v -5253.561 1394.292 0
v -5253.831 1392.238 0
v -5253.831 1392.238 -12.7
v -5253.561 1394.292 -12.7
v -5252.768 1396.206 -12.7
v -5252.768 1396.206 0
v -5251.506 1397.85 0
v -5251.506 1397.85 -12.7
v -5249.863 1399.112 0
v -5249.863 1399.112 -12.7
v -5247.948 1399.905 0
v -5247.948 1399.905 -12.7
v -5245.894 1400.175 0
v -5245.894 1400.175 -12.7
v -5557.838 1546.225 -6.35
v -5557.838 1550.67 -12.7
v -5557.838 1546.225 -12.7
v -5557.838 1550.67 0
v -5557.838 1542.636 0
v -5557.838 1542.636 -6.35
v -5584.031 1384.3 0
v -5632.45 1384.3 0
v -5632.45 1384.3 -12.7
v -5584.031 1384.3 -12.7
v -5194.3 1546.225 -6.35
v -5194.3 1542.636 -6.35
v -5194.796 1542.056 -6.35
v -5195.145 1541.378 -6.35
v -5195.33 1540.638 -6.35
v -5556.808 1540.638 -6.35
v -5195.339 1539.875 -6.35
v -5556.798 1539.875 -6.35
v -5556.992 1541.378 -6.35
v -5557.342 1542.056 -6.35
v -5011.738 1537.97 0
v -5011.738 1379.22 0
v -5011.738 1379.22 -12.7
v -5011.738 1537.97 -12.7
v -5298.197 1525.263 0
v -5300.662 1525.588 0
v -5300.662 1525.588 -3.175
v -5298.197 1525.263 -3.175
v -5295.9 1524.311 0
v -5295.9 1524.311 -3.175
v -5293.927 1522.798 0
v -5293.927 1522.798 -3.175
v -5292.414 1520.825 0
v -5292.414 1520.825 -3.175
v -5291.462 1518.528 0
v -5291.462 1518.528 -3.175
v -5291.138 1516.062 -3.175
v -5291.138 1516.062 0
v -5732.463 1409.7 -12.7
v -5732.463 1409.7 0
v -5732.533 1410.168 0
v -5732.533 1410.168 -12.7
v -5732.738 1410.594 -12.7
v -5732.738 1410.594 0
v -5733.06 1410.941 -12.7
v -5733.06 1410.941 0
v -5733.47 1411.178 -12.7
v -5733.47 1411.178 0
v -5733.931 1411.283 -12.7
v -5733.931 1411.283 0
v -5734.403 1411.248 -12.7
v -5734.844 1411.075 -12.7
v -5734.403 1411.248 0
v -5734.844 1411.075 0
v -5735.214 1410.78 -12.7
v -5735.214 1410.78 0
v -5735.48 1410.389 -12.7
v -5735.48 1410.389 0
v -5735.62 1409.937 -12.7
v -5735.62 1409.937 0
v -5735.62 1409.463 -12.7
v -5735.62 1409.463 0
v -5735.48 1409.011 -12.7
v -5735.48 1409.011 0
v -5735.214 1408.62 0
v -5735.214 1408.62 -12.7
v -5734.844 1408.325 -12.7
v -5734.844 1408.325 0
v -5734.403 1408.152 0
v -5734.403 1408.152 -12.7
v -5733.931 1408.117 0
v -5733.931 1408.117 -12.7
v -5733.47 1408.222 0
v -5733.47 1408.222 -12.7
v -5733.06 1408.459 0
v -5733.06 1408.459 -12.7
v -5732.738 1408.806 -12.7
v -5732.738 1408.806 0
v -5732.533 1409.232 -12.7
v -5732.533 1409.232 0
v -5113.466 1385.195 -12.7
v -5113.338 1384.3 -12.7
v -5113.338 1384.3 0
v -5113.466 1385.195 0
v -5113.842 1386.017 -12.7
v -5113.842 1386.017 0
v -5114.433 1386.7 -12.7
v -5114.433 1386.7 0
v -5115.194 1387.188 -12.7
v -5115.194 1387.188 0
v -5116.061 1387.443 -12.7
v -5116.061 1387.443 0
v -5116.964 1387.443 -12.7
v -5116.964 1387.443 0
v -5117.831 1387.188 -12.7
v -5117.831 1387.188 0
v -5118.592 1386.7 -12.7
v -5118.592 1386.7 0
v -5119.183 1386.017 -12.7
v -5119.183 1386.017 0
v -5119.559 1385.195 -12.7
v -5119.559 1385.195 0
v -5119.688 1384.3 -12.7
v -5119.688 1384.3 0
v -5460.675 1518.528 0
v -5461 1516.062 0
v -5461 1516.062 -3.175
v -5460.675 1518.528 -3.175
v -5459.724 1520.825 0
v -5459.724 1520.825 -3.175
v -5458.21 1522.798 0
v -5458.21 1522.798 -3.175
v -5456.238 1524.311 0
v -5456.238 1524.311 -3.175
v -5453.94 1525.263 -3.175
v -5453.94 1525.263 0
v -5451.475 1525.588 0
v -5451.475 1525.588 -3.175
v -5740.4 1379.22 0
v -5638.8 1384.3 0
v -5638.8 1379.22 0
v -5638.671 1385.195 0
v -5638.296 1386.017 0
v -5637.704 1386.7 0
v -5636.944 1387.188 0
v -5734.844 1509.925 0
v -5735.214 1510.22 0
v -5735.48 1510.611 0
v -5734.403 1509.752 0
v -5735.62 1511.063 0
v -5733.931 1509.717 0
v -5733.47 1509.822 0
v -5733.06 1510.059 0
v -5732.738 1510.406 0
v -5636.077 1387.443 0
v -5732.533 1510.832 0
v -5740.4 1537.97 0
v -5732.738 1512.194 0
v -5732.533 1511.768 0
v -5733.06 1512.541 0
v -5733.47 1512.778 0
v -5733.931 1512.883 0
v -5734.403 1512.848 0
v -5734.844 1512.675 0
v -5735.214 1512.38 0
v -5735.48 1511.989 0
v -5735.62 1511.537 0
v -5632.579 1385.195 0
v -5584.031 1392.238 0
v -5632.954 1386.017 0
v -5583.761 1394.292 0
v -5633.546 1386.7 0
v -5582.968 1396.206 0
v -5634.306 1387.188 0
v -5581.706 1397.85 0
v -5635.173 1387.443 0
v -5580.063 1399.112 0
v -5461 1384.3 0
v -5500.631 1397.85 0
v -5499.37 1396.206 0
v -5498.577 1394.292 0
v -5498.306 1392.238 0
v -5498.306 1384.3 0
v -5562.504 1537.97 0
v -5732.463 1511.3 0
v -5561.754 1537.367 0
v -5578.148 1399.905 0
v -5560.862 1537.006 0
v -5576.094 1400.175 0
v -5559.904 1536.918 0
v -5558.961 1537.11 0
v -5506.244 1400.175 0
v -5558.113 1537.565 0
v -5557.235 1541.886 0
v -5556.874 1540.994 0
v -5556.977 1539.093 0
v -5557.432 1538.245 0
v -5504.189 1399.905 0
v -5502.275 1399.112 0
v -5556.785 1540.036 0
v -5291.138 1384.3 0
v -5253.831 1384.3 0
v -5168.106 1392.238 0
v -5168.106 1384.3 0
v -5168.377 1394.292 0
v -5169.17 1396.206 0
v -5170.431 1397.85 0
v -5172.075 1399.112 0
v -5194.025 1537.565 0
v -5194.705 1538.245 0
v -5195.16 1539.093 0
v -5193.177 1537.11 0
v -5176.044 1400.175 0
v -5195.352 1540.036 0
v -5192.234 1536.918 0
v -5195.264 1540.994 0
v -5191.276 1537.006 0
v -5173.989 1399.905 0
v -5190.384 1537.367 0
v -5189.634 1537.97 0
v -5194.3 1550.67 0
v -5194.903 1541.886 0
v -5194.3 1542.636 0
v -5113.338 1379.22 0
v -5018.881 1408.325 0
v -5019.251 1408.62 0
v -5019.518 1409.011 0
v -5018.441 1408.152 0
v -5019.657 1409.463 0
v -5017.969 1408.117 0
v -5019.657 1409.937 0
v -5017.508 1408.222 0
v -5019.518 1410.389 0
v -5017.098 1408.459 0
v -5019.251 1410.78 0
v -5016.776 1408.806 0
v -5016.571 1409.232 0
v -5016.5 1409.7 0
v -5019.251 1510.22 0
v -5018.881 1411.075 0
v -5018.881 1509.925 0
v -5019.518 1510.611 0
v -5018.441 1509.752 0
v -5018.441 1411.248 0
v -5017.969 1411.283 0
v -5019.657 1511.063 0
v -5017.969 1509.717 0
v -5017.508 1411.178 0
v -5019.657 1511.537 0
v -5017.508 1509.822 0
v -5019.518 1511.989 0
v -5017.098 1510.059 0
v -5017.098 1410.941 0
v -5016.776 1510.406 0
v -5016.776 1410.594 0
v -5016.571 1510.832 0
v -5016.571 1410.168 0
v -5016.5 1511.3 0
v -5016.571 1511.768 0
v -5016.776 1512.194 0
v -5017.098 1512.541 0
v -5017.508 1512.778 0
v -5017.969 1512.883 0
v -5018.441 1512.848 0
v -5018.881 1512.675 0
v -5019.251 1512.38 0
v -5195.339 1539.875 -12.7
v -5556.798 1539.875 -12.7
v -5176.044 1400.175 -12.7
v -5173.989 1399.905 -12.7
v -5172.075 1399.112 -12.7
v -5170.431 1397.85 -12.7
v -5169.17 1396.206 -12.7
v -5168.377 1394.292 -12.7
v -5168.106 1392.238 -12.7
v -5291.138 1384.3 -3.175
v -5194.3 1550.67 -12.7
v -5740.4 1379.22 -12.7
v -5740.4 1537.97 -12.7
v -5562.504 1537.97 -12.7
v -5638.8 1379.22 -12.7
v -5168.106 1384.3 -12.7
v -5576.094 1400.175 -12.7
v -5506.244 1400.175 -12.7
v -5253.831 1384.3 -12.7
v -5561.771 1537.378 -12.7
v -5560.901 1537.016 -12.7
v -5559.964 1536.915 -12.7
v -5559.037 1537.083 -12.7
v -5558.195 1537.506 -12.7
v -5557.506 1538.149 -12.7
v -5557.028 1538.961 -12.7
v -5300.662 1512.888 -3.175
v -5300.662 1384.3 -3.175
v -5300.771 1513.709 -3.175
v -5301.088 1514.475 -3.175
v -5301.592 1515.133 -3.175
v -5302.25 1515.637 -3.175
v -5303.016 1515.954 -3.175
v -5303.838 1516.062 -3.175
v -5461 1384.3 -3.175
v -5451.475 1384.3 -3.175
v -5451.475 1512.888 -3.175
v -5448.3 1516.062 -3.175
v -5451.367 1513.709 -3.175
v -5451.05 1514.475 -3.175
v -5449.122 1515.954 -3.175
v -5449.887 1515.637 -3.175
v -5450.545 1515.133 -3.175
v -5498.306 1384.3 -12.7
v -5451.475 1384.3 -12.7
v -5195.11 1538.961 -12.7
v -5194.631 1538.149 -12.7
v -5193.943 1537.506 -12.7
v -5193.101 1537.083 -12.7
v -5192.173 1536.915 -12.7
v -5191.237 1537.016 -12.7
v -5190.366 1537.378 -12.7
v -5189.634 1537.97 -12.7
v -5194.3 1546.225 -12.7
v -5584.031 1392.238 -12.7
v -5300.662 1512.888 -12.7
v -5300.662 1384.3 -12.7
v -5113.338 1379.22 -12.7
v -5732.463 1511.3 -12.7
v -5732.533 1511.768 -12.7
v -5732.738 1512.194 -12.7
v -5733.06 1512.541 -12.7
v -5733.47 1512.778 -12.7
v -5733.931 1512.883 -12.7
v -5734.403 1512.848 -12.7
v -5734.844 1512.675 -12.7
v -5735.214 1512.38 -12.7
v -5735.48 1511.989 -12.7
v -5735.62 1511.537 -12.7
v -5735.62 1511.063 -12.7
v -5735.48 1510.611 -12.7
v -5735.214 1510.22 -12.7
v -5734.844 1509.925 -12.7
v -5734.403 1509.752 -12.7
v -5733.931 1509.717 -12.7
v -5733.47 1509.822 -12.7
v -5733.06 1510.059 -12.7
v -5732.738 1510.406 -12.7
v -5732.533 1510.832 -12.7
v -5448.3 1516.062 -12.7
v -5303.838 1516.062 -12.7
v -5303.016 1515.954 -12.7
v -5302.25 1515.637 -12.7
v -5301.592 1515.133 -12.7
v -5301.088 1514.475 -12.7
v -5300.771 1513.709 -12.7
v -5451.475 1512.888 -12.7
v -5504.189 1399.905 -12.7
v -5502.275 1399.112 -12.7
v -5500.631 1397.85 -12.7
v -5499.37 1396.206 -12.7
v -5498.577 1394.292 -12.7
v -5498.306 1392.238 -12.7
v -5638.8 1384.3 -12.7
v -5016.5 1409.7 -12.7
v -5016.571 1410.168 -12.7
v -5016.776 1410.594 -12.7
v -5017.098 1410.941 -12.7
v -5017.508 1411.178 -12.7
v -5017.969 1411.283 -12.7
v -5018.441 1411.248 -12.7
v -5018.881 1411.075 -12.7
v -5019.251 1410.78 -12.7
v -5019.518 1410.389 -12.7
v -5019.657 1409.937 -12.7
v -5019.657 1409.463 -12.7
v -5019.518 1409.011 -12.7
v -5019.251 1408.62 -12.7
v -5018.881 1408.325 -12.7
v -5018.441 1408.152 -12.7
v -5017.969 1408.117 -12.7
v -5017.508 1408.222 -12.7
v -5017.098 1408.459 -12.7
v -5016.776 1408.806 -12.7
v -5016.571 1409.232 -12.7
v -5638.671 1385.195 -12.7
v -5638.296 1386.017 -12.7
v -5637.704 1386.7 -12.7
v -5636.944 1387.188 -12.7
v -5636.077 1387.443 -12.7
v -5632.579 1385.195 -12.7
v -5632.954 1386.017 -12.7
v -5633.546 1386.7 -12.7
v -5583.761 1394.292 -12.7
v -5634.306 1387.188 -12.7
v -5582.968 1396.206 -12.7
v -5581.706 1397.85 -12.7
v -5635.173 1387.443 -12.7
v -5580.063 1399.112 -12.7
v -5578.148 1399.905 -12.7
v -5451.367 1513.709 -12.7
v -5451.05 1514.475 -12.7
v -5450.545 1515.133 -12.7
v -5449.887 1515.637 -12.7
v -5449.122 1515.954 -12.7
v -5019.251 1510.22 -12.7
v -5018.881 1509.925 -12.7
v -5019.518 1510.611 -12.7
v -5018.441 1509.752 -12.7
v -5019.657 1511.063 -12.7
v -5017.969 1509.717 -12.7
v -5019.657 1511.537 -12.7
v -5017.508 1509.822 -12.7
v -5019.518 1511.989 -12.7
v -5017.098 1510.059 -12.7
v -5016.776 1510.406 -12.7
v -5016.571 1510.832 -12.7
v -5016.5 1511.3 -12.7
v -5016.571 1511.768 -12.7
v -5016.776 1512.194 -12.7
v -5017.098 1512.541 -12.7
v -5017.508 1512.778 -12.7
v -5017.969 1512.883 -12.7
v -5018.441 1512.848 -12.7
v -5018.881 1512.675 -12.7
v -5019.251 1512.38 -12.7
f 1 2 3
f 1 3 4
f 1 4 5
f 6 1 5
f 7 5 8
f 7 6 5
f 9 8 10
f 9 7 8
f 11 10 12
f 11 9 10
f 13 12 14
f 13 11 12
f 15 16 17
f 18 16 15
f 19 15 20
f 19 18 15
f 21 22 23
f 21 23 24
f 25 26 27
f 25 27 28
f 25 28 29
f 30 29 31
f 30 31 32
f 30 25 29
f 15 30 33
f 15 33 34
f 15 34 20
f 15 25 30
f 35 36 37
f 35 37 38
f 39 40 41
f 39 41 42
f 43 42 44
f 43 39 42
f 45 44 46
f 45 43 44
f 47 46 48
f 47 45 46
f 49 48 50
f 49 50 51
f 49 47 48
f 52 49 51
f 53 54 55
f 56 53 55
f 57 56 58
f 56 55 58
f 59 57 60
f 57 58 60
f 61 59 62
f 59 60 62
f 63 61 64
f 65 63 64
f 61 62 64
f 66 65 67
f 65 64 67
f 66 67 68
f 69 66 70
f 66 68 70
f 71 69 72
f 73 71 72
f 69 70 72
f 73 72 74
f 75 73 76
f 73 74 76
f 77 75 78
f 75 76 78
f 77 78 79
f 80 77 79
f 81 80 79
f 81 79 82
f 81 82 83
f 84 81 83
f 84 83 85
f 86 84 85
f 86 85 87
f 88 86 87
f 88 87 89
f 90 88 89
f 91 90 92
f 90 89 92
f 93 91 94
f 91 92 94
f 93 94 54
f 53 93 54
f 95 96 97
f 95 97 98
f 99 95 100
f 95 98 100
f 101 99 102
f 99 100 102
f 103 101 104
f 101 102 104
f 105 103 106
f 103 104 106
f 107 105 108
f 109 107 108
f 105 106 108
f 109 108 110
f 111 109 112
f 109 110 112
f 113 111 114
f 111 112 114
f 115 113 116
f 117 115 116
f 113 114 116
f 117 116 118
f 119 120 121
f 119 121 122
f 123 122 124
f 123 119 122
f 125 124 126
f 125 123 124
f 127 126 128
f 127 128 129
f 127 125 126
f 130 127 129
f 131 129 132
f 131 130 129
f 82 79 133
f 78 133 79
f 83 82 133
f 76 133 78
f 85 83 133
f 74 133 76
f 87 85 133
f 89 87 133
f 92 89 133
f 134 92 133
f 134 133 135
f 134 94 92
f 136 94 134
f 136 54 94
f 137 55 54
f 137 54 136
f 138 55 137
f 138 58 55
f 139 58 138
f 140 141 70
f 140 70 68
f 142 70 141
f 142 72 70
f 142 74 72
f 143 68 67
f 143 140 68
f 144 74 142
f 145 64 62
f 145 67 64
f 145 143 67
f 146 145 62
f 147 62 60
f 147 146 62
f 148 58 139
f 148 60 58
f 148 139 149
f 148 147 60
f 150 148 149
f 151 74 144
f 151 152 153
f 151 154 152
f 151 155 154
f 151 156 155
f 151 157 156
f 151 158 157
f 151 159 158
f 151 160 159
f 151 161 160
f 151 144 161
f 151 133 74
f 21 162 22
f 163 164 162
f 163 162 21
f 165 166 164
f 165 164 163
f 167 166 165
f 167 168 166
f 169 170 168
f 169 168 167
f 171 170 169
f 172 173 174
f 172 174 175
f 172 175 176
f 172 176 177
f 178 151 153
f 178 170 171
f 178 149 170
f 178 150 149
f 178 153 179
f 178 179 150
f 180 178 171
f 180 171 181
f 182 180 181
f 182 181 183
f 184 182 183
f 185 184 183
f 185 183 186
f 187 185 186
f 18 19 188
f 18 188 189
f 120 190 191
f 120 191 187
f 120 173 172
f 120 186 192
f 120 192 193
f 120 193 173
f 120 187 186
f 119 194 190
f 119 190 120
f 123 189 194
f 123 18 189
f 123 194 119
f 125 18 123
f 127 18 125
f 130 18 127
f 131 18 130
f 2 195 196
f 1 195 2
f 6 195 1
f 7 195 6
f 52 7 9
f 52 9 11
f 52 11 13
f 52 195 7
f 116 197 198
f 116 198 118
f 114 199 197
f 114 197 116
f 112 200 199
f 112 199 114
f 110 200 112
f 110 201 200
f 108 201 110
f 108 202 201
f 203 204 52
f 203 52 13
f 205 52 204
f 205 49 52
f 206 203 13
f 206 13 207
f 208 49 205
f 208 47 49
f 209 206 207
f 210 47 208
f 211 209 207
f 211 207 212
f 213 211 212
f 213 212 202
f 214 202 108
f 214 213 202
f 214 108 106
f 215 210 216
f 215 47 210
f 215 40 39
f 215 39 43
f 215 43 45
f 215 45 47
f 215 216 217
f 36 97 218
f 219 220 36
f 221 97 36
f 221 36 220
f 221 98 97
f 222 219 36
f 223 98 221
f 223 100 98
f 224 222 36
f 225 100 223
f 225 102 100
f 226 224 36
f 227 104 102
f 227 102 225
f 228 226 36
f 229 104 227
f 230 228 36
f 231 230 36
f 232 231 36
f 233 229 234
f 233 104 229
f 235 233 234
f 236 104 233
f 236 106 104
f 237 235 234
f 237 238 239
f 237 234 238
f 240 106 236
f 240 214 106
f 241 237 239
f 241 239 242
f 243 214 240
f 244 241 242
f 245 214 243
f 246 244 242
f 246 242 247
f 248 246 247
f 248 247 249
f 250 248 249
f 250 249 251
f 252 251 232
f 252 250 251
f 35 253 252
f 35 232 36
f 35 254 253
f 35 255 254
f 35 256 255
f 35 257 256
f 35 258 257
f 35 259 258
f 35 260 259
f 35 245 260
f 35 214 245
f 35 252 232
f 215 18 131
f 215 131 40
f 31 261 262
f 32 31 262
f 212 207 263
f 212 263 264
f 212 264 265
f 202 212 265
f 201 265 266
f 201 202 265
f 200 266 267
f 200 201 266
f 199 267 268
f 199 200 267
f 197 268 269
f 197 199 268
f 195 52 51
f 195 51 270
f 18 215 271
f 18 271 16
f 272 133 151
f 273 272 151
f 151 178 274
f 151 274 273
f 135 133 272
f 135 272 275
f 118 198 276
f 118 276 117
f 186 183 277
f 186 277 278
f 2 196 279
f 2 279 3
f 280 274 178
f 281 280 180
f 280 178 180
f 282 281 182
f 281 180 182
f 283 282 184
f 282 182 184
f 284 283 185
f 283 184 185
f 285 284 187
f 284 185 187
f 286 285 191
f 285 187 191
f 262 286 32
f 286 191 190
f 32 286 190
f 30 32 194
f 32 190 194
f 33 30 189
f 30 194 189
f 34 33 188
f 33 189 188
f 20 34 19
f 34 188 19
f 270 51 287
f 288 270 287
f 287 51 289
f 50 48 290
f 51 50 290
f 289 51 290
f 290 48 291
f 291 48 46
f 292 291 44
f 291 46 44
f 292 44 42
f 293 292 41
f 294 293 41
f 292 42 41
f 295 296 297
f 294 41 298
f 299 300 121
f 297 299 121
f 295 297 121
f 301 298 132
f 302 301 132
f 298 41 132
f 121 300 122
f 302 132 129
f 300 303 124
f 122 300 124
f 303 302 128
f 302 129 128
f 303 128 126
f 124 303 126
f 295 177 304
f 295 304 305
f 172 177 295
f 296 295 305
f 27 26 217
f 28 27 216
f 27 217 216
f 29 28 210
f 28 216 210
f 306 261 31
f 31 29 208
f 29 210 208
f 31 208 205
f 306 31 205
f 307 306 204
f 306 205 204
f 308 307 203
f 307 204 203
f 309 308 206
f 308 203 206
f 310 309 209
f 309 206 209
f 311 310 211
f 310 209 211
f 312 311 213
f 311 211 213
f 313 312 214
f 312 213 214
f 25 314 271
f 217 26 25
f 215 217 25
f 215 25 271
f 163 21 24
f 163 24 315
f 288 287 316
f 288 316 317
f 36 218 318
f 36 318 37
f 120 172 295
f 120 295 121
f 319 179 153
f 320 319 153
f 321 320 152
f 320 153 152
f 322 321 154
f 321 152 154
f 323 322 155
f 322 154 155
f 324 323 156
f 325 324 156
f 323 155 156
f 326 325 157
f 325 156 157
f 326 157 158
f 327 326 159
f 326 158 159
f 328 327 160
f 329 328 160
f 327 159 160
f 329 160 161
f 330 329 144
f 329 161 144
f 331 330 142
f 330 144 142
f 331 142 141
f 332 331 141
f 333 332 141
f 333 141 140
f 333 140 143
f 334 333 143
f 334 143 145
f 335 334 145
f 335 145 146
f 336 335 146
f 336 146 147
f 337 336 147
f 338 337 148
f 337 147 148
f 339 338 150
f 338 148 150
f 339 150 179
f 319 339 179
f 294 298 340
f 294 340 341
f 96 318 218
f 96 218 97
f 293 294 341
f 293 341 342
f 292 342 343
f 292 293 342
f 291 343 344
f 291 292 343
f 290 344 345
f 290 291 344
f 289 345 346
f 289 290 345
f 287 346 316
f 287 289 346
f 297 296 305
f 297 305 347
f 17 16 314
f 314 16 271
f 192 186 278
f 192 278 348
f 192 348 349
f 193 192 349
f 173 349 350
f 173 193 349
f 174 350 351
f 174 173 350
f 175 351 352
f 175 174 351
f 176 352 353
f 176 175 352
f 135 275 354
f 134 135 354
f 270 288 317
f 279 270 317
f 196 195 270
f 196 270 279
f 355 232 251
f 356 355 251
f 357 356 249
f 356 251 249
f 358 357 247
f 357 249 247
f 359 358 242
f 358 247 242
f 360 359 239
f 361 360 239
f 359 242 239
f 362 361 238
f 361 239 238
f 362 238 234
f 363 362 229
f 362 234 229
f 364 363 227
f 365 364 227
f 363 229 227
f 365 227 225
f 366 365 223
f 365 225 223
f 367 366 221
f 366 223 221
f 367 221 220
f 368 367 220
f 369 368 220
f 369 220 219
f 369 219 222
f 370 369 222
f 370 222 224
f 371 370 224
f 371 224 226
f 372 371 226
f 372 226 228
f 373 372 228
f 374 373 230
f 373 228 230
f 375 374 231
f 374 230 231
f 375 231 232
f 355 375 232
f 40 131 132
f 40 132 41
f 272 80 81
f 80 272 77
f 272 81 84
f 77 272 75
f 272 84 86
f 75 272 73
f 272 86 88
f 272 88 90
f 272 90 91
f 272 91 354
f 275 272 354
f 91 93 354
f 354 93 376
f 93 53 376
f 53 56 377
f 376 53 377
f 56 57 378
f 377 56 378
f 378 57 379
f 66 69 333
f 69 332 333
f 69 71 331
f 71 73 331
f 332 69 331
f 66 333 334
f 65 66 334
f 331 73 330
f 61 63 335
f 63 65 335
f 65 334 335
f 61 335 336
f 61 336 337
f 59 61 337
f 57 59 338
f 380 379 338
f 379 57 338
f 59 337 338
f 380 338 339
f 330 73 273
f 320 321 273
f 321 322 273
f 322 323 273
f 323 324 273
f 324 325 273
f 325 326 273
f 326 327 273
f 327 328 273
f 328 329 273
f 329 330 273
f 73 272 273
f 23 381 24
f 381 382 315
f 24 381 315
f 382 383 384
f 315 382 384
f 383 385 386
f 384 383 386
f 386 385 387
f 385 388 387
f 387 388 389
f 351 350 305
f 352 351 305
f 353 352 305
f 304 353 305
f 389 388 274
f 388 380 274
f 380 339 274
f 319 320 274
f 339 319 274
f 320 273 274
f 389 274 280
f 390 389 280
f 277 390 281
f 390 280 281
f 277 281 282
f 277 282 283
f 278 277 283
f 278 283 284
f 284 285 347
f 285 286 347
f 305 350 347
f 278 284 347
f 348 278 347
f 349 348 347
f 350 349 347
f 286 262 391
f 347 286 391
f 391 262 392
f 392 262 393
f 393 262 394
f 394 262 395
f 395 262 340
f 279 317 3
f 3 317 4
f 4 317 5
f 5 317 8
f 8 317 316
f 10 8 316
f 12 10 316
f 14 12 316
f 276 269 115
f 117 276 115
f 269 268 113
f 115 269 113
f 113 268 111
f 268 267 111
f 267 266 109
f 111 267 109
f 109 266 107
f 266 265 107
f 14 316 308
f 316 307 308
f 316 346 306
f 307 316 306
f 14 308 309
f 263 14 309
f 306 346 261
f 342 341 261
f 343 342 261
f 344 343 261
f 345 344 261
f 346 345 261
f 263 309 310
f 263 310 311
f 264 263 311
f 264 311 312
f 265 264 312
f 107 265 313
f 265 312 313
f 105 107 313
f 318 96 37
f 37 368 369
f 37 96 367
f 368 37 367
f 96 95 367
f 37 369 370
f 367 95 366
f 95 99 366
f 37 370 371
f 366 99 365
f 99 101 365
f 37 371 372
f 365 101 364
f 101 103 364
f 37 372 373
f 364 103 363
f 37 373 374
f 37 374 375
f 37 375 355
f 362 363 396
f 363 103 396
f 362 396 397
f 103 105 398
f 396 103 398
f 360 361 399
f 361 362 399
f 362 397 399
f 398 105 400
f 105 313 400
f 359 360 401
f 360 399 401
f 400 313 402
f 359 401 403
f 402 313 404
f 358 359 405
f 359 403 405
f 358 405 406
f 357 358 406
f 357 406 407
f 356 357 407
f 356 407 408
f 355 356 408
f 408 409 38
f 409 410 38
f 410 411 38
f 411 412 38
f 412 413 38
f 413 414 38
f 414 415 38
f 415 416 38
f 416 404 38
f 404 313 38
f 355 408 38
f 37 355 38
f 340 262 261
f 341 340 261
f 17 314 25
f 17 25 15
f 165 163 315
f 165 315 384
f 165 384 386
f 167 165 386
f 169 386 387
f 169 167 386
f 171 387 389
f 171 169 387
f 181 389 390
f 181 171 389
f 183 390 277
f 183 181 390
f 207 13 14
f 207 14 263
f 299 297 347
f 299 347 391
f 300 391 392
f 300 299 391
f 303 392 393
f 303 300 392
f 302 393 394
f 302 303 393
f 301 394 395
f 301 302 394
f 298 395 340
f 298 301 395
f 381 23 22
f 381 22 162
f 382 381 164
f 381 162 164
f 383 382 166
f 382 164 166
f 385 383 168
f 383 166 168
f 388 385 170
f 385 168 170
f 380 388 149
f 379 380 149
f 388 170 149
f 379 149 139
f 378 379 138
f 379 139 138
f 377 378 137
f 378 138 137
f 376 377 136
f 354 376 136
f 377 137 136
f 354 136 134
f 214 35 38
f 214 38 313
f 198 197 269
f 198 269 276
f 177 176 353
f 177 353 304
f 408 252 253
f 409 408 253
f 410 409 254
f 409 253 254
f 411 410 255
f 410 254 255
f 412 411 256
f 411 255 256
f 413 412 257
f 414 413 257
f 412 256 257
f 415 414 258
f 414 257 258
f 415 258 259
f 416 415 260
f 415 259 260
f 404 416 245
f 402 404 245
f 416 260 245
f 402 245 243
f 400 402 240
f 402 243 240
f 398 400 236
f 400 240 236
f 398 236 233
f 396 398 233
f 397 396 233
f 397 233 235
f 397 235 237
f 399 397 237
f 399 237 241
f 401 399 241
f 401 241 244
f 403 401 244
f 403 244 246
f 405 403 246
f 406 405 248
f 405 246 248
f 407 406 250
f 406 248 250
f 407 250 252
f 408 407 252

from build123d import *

# Parameters (mm, degrees)
EXTRUDE1_DEPTH     = 12.7
SKETCH6_R          = 3.302
CUT_EXTRUDE4_DEPTH = 12.7
CUT_EXTRUDE1_DEPTH = 3.175
SKETCH4_R          = 1.5875
CUT_EXTRUDE2_DEPTH = 12.7
SKETCH5_W          = 363.5375
SKETCH5_H          = 6.35
CUT_EXTRUDE3_DEPTH = 6.35
SKETCH7_W          = 101.6
SKETCH7_H          = 5.08
EXTRUDE2_DEPTH     = 12.7
SKETCH8_R          = 3.175
CUT_EXTRUDE5_DEPTH = 12.7


with BuildPart() as part:
    # Sketch2 → Extrude1 (new body)
    with BuildSketch(Plane.XY):
        with BuildLine():
            Line((-5740.4, 1537.97), (-5740.4, 1384.3))
            Line((-5740.4, 1384.3), (-5584.03125, 1384.3))
            Line((-5584.03125, 1384.3), (-5584.03125, 1392.2375))
            ThreePointArc((-5584.03125, 1392.2375), (-5581.706410076, 1397.850160076), (-5576.09375, 1400.175))
            Line((-5576.09375, 1400.175), (-5506.24375, 1400.175))
            ThreePointArc((-5506.24375, 1400.175), (-5500.631089924, 1397.850160076), (-5498.30625, 1392.2375))
            Line((-5498.30625, 1392.2375), (-5498.30625, 1384.3))
            Line((-5498.30625, 1384.3), (-5451.475, 1384.3))
            Line((-5451.475, 1384.3), (-5451.475, 1512.8875))
            ThreePointArc((-5451.475, 1512.8875), (-5450.54506403, 1515.13256403), (-5448.3, 1516.0625))
            Line((-5448.3, 1516.0625), (-5303.8375, 1516.0625))
            ThreePointArc((-5303.8375, 1516.0625), (-5301.59243597, 1515.13256403), (-5300.6625, 1512.8875))
            Line((-5300.6625, 1512.8875), (-5300.6625, 1384.3))
            Line((-5300.6625, 1384.3), (-5253.83125, 1384.3))
            Line((-5253.83125, 1384.3), (-5253.83125, 1392.2375))
            ThreePointArc((-5253.83125, 1392.2375), (-5251.506410076, 1397.850160076), (-5245.89375, 1400.175))
            Line((-5245.89375, 1400.175), (-5176.04375, 1400.175))
            ThreePointArc((-5176.04375, 1400.175), (-5170.431089924, 1397.850160076), (-5168.10625, 1392.2375))
            Line((-5168.10625, 1392.2375), (-5168.10625, 1384.3))
            Line((-5168.10625, 1384.3), (-5011.7375, 1384.3))
            Line((-5011.7375, 1384.3), (-5011.7375, 1537.97))
            Line((-5011.7375, 1537.97), (-5194.3, 1537.97))
            Line((-5194.3, 1537.97), (-5194.3, 1550.67))
            Line((-5194.3, 1550.67), (-5557.8375, 1550.67))
            Line((-5557.8375, 1550.67), (-5557.8375, 1537.97))
            Line((-5557.8375, 1537.97), (-5740.4, 1537.97))
        make_face()
    extrude(amount=-EXTRUDE1_DEPTH)

    # Sketch6 → Cut-Extrude4 (cut)
    with BuildSketch(Plane.XY):
        with Locations((-5560.08256403, 1540.21506403)):
            Circle(SKETCH6_R)
        with Locations((-5192.05493597, 1540.21506403)):
            Circle(SKETCH6_R)
    extrude(amount=-CUT_EXTRUDE4_DEPTH, mode=Mode.SUBTRACT)

    # Sketch3 → Cut-Extrude1 (cut)
    with BuildSketch(Plane.XY):
        with BuildLine():
            Line((-5297.4875, 1377.95), (-5454.65, 1377.95))
            ThreePointArc((-5454.65, 1377.95), (-5459.140128061, 1379.809871939), (-5461, 1384.3))
            Line((-5461, 1384.3), (-5461, 1516.0625))
            ThreePointArc((-5461, 1516.0625), (-5458.210192091, 1522.797692091), (-5451.475, 1525.5875))
            Line((-5451.475, 1525.5875), (-5300.6625, 1525.5875))
            ThreePointArc((-5300.6625, 1525.5875), (-5293.927307909, 1522.797692091), (-5291.1375, 1516.0625))
            Line((-5291.1375, 1516.0625), (-5291.1375, 1384.3))
            ThreePointArc((-5291.1375, 1384.3), (-5292.997371939, 1379.809871939), (-5297.4875, 1377.95))
        make_face()
    extrude(amount=-CUT_EXTRUDE1_DEPTH, mode=Mode.SUBTRACT)

    # Sketch4 → Cut-Extrude2 (cut)
    with BuildSketch(Plane.XY):
        with Locations((-5734.05, 1511.3)):
            Circle(SKETCH4_R)
        with Locations((-5734.05, 1409.7)):
            Circle(SKETCH4_R)
        with Locations((-5018.0875, 1409.7)):
            Circle(SKETCH4_R)
        with Locations((-5018.0875, 1511.3)):
            Circle(SKETCH4_R)
    extrude(amount=-CUT_EXTRUDE2_DEPTH, mode=Mode.SUBTRACT)

    # Sketch5 → Cut-Extrude3 (cut)
    with BuildSketch(Plane(origin=(0, 0, -12.7), x_dir=(-1, 0, 0), z_dir=(0, 0, -1))):
        with Locations((5376.06875, 1543.05)):
            Rectangle(SKETCH5_W, SKETCH5_H)
    extrude(amount=-CUT_EXTRUDE3_DEPTH, mode=Mode.SUBTRACT)

    # Sketch7 → Extrude2 (add)
    with BuildSketch(Plane.XY):
        with Locations((-5689.6, 1381.76)):
            Rectangle(SKETCH7_W, SKETCH7_H)
        with Locations((-5062.5375, 1381.76)):
            Rectangle(SKETCH7_W, SKETCH7_H)
    extrude(amount=-EXTRUDE2_DEPTH)

    # Sketch8 → Cut-Extrude5 (cut)
    with BuildSketch(Plane.XY):
        with Locations((-5635.625, 1384.3)):
            Circle(SKETCH8_R)
        with Locations((-5116.5125, 1384.3)):
            Circle(SKETCH8_R)
    extrude(amount=-CUT_EXTRUDE5_DEPTH, mode=Mode.SUBTRACT)


solid = part.part
